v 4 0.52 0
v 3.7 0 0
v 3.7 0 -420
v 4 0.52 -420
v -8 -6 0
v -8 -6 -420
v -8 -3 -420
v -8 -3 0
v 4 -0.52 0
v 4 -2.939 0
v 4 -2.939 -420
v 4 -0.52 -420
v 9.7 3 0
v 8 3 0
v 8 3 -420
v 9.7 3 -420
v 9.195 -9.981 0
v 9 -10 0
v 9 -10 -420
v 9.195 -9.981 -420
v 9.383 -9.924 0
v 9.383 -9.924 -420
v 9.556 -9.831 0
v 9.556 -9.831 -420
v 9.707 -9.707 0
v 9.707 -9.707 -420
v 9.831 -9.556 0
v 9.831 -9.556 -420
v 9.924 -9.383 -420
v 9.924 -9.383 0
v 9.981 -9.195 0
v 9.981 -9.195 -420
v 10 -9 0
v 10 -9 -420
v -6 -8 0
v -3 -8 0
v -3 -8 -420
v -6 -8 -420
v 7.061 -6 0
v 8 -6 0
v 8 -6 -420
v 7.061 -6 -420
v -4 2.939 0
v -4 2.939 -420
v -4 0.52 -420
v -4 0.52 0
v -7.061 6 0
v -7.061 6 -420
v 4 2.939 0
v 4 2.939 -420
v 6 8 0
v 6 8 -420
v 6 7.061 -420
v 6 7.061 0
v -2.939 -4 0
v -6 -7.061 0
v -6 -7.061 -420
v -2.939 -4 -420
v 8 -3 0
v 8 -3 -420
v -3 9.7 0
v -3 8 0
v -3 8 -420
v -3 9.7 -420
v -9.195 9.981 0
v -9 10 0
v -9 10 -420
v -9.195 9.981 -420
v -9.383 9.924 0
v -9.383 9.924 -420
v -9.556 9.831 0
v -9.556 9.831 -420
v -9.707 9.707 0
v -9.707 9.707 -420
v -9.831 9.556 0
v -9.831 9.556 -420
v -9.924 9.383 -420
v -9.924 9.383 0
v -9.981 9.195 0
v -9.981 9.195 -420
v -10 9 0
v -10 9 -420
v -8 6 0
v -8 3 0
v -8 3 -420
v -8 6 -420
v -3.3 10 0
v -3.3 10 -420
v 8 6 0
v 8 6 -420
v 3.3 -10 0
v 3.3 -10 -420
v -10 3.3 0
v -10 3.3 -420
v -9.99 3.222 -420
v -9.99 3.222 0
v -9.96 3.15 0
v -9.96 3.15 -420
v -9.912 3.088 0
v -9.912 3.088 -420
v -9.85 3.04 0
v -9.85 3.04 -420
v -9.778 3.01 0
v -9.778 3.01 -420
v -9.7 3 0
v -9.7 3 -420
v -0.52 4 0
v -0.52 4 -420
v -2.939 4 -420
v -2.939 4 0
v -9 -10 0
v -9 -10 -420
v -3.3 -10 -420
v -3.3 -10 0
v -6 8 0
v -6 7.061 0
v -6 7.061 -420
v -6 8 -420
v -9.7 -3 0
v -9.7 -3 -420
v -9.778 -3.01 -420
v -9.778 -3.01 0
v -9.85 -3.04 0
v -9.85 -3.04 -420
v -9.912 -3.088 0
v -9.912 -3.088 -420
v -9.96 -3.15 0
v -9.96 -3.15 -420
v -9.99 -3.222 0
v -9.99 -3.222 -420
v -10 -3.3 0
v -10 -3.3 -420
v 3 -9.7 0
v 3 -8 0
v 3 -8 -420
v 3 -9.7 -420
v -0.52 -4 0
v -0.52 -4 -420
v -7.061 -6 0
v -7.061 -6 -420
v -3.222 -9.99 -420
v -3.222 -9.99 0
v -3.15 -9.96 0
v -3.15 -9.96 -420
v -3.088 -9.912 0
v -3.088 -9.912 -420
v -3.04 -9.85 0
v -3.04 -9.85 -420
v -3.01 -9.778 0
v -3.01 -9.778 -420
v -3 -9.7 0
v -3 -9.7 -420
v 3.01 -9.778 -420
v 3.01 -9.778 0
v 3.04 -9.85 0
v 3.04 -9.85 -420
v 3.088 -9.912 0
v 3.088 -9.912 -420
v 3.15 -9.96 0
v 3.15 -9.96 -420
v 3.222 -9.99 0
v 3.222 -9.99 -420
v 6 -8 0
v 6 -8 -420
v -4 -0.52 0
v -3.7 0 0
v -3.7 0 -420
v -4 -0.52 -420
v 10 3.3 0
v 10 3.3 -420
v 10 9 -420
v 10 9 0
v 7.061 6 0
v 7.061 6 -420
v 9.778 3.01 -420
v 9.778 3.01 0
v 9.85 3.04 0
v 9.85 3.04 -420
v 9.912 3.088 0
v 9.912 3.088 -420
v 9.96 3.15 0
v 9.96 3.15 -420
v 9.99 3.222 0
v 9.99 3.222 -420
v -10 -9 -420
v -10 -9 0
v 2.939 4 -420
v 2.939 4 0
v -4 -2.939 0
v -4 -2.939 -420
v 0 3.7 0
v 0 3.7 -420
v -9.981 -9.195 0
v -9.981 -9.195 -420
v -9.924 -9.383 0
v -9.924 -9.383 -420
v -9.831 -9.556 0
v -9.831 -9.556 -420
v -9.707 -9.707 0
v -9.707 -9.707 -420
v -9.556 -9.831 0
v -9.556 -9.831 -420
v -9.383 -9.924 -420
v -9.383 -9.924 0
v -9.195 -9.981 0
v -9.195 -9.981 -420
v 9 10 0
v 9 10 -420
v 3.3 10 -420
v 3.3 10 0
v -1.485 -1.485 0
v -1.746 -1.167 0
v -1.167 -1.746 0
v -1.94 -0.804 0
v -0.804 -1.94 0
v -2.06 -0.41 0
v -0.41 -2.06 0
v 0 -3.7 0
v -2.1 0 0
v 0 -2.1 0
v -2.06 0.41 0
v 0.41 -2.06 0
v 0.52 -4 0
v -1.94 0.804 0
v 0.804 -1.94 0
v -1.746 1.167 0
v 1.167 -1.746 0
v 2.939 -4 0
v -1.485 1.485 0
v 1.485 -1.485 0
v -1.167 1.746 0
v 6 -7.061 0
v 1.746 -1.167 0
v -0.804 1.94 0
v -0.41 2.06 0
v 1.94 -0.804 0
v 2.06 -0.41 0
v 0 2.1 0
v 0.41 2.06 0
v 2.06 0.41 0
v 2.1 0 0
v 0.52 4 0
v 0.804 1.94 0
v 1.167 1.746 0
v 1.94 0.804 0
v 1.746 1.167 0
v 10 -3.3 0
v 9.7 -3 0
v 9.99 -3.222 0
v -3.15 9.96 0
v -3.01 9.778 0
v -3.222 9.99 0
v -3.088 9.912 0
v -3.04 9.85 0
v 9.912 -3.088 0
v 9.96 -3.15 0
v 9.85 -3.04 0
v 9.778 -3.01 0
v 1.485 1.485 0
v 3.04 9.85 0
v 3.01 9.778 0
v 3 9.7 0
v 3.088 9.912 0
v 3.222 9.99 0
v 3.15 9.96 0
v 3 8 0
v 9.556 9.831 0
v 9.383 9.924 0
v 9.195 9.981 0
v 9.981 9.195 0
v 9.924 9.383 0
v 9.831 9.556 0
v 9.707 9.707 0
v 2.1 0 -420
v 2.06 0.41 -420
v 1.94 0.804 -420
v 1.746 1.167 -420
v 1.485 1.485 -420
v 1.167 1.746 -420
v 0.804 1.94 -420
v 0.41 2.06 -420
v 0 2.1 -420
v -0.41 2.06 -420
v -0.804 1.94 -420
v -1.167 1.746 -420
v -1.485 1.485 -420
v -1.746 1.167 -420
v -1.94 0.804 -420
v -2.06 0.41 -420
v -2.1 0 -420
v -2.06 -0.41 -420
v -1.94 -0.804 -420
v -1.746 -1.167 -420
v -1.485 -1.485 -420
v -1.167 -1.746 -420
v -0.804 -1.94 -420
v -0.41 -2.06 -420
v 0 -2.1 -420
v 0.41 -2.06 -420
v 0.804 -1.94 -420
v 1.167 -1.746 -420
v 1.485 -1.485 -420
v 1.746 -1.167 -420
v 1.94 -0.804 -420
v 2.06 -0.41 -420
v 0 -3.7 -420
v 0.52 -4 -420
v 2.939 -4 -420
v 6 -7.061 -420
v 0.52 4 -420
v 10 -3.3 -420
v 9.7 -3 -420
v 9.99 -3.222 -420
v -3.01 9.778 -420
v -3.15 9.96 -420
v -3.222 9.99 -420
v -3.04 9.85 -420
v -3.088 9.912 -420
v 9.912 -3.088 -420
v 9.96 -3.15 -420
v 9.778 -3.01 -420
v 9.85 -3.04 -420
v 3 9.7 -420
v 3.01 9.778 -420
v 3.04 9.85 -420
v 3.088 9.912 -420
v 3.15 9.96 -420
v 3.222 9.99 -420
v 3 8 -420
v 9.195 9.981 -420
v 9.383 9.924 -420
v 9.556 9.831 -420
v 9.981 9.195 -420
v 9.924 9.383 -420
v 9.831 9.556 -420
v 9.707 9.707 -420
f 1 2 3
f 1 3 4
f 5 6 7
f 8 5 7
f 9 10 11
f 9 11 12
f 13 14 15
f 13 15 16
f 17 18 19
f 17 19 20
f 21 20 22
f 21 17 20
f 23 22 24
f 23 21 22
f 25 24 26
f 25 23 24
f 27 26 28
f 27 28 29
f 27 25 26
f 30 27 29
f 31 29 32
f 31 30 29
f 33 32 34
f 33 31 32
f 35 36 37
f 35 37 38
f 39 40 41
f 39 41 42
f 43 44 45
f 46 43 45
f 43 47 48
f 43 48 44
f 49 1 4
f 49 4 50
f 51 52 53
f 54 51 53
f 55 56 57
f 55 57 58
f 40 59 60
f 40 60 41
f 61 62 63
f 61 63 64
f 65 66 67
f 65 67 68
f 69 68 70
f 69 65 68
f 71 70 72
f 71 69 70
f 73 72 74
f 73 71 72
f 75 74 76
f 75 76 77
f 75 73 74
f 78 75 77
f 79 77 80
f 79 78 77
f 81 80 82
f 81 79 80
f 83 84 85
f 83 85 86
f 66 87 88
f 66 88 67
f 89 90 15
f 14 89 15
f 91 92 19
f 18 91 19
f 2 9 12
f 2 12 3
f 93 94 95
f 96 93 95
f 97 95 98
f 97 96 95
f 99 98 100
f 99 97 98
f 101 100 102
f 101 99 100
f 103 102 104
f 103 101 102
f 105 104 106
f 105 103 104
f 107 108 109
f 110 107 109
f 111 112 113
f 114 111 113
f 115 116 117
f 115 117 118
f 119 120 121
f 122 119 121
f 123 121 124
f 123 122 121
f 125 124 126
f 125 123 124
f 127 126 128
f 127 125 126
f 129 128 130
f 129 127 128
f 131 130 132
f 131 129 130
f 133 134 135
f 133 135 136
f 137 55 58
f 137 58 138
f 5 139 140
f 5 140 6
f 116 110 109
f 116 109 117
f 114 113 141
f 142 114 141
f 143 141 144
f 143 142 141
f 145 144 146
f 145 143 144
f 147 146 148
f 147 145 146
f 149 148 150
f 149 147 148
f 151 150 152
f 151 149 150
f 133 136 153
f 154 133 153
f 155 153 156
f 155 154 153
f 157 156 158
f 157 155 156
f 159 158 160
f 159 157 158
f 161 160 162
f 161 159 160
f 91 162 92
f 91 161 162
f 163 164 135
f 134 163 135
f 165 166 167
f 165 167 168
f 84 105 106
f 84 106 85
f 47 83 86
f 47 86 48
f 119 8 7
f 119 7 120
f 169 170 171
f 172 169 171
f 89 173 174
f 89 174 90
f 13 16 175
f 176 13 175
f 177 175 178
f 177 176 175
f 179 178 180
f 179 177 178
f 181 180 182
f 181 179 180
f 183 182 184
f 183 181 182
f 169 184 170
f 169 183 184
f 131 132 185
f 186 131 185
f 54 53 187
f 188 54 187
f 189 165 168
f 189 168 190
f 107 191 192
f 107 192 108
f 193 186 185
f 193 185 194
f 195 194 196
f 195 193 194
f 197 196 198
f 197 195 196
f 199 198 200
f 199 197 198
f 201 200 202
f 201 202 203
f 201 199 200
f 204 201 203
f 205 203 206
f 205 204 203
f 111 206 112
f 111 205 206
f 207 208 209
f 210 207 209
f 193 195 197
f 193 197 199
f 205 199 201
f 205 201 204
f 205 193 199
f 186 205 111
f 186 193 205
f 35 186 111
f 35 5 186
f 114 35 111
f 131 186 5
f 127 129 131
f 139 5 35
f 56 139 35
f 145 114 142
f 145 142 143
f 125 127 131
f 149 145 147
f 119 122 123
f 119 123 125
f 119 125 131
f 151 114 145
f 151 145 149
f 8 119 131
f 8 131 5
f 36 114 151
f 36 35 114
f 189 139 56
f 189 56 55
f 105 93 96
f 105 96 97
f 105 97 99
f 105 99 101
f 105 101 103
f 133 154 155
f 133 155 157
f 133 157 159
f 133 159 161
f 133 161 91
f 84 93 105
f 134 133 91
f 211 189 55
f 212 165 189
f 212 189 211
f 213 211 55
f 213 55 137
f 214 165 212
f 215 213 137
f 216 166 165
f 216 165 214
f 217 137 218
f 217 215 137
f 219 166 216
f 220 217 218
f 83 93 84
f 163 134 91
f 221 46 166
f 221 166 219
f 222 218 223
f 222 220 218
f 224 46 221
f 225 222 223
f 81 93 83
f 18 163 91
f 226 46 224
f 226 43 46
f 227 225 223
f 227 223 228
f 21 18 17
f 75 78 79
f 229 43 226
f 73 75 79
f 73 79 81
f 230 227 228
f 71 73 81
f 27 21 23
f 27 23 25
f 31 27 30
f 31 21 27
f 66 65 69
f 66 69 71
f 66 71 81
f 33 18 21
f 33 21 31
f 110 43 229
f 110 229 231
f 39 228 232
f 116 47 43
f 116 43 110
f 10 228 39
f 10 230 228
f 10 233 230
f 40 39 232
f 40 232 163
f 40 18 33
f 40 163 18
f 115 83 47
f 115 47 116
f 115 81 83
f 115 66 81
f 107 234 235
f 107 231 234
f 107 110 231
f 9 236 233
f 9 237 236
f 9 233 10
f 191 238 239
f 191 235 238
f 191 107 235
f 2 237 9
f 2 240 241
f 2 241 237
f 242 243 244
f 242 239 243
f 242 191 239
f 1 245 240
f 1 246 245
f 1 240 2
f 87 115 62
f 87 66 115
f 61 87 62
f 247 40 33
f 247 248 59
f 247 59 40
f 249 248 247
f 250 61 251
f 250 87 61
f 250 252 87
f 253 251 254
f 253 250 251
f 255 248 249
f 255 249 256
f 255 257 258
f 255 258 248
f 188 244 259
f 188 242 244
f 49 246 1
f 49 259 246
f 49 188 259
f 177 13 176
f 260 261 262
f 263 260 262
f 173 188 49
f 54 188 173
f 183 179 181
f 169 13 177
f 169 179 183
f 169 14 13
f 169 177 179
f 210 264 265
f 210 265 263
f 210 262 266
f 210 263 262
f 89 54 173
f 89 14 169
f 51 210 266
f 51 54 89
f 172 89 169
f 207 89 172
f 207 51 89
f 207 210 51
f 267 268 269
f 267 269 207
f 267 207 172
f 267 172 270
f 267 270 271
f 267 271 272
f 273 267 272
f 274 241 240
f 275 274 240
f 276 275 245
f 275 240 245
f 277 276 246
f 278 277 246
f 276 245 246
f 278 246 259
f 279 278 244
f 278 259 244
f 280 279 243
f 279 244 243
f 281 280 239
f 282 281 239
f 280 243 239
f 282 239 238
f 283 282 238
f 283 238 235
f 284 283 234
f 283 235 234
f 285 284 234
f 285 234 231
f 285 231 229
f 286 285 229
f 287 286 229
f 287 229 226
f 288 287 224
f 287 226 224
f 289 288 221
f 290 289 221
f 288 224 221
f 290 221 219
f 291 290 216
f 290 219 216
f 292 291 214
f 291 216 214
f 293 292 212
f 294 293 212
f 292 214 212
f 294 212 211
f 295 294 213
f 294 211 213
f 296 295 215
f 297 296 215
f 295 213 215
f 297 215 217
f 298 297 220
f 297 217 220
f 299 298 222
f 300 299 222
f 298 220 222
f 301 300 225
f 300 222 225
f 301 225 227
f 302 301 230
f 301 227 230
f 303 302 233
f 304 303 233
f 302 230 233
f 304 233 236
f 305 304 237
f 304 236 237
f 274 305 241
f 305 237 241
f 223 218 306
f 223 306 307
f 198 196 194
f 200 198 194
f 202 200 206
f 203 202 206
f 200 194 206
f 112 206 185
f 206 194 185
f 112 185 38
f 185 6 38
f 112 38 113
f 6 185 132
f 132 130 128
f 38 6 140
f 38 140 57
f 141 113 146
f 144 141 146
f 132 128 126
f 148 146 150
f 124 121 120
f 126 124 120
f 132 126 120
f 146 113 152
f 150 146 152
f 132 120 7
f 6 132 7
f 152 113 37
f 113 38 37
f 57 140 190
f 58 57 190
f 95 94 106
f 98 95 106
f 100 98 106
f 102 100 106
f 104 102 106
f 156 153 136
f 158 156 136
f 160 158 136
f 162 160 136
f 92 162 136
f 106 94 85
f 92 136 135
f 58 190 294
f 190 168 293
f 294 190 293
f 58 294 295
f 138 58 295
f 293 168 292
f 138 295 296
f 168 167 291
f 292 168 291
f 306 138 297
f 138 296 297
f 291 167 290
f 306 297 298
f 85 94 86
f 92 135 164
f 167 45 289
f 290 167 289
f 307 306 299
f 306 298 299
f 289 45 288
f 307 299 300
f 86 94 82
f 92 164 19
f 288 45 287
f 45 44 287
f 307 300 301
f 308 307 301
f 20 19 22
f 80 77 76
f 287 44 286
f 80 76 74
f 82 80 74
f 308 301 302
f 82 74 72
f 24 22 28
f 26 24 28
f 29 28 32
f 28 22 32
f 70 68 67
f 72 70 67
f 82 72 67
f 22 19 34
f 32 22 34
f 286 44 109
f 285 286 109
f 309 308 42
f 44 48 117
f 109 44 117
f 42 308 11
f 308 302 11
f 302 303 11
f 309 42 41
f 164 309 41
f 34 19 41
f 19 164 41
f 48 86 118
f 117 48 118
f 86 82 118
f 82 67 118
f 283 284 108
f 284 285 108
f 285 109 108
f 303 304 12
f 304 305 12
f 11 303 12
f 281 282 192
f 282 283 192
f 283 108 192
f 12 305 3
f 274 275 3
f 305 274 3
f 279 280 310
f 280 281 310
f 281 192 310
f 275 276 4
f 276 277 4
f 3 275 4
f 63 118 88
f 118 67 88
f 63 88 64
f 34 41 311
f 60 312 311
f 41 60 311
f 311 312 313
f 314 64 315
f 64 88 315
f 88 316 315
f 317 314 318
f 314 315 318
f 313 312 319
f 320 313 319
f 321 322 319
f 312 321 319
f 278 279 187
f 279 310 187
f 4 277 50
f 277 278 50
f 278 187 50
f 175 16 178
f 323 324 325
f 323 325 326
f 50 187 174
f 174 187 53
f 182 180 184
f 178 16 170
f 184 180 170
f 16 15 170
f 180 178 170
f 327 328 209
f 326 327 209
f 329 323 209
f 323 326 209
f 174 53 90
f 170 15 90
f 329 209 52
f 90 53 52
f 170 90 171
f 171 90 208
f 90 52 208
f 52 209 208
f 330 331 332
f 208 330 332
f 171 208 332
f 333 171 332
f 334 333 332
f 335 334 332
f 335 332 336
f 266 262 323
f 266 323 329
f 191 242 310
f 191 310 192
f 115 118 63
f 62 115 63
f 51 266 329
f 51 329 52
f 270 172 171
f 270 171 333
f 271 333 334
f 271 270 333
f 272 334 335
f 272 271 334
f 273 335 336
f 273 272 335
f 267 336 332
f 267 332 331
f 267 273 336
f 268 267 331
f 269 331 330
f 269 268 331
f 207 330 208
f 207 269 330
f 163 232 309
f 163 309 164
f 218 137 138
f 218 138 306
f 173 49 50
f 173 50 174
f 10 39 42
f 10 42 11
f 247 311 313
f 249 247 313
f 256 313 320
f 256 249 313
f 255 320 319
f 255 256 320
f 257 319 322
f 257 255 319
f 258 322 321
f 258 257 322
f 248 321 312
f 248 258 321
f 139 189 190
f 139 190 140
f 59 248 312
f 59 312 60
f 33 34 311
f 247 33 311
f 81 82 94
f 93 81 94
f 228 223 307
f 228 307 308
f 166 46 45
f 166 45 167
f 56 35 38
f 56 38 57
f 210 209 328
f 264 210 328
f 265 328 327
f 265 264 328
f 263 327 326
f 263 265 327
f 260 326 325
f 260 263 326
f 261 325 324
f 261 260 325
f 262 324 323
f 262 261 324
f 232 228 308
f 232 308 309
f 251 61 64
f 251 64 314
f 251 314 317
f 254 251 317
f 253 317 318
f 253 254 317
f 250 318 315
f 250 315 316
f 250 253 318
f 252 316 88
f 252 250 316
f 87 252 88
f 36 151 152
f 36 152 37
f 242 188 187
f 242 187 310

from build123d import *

# Parameters (mm, degrees)
SKETCH1_R           = 2.1
BOSS_EXTRUDE1_DEPTH = 420


with BuildPart() as part:
    # Sketch1 → Boss-Extrude1 (new body)
    with BuildSketch(Plane.XY):
        with BuildLine():
            Line((-10, 9), (-10, 3.29999995))
            ThreePointArc((-10, 3.29999995), (-9.912132049, 3.087867916), (-9.7, 3))
            Line((-9.7, 3), (-8, 3))
            Line((-8, 3), (-8, 6))
            Line((-8, 6), (-7.060677, 6))
            Line((-7.060677, 6), (-4, 2.93932965))
            Line((-4, 2.93932965), (-4, 0.519615242))
            Line((-4, 0.519615242), (-3.699996283, -6.437e-06))
            Line((-3.699996283, -6.437e-06), (-4, -0.519628117))
            Line((-4, -0.519628117), (-4, -2.93933725))
            Line((-4, -2.93933725), (-7.0606695, -6))
            Line((-7.0606695, -6), (-8, -6))
            Line((-8, -6), (-8, -3))
            Line((-8, -3), (-9.7, -3))
            ThreePointArc((-9.7, -3), (-9.912132049, -3.087867916), (-10, -3.29999995))
            Line((-10, -3.29999995), (-10, -9))
            ThreePointArc((-10, -9), (-9.707106781, -9.707106781), (-9, -10))
            Line((-9, -10), (-3.29999995, -10))
            ThreePointArc((-3.29999995, -10), (-3.087867916, -9.912132049), (-3, -9.7))
            Line((-3, -9.7), (-3, -8))
            Line((-3, -8), (-6, -8))
            Line((-6, -8), (-6, -7.0606515))
            Line((-6, -7.0606515), (-2.9393489, -4))
            Line((-2.9393489, -4), (-0.519615242, -4))
            Line((-0.519615242, -4), (6.437e-06, -3.699996283))
            Line((6.437e-06, -3.699996283), (0.519628117, -4))
            Line((0.519628117, -4), (2.9393227, -4))
            Line((2.9393227, -4), (6, -7.060677))
            Line((6, -7.060677), (6, -8))
            Line((6, -8), (3, -8))
            Line((3, -8), (3, -9.7))
            ThreePointArc((3, -9.7), (3.087867916, -9.912132049), (3.29999995, -10))
            Line((3.29999995, -10), (9, -10))
            ThreePointArc((9, -10), (9.707106781, -9.707106781), (10, -9))
            Line((10, -9), (10, -3.29999995))
            ThreePointArc((10, -3.29999995), (9.912132049, -3.087867916), (9.7, -3))
            Line((9.7, -3), (8, -3))
            Line((8, -3), (8, -6))
            Line((8, -6), (7.0606435, -6))
            Line((7.0606435, -6), (4, -2.9393482))
            Line((4, -2.9393482), (4, -0.519615242))
            Line((4, -0.519615242), (3.699996283, 6.437e-06))
            Line((3.699996283, 6.437e-06), (4, 0.519628117))
            Line((4, 0.519628117), (4, 2.9393401))
            Line((4, 2.9393401), (7.060651, 6))
            Line((7.060651, 6), (8, 6))
            Line((8, 6), (8, 3))
            Line((8, 3), (9.7, 3))
            ThreePointArc((9.7, 3), (9.912132049, 3.087867916), (10, 3.29999995))
            Line((10, 3.29999995), (10, 9))
            ThreePointArc((10, 9), (9.707106781, 9.707106781), (9, 10))
            Line((9, 10), (3.29999995, 10))
            ThreePointArc((3.29999995, 10), (3.087867916, 9.912132049), (3, 9.7))
            Line((3, 9.7), (3, 8))
            Line((3, 8), (6, 8))
            Line((6, 8), (6, 7.060669))
            Line((6, 7.060669), (2.9393308, 4))
            Line((2.9393308, 4), (0.519615242, 4))
            Line((0.519615242, 4), (-6.437e-06, 3.699996283))
            Line((-6.437e-06, 3.699996283), (-0.519628117, 4))
            Line((-0.519628117, 4), (-2.93935655, 4))
            Line((-2.93935655, 4), (-6, 7.0606435))
            Line((-6, 7.0606435), (-6, 8))
            Line((-6, 8), (-3, 8))
            Line((-3, 8), (-3, 9.7))
            ThreePointArc((-3, 9.7), (-3.087867966, 9.912132034), (-3.3, 10))
            Line((-3.3, 10), (-9, 10))
            ThreePointArc((-9, 10), (-9.707106781, 9.707106781), (-10, 9))
        make_face()
        Circle(SKETCH1_R, mode=Mode.SUBTRACT)
    extrude(amount=-BOSS_EXTRUDE1_DEPTH)


solid = part.part
